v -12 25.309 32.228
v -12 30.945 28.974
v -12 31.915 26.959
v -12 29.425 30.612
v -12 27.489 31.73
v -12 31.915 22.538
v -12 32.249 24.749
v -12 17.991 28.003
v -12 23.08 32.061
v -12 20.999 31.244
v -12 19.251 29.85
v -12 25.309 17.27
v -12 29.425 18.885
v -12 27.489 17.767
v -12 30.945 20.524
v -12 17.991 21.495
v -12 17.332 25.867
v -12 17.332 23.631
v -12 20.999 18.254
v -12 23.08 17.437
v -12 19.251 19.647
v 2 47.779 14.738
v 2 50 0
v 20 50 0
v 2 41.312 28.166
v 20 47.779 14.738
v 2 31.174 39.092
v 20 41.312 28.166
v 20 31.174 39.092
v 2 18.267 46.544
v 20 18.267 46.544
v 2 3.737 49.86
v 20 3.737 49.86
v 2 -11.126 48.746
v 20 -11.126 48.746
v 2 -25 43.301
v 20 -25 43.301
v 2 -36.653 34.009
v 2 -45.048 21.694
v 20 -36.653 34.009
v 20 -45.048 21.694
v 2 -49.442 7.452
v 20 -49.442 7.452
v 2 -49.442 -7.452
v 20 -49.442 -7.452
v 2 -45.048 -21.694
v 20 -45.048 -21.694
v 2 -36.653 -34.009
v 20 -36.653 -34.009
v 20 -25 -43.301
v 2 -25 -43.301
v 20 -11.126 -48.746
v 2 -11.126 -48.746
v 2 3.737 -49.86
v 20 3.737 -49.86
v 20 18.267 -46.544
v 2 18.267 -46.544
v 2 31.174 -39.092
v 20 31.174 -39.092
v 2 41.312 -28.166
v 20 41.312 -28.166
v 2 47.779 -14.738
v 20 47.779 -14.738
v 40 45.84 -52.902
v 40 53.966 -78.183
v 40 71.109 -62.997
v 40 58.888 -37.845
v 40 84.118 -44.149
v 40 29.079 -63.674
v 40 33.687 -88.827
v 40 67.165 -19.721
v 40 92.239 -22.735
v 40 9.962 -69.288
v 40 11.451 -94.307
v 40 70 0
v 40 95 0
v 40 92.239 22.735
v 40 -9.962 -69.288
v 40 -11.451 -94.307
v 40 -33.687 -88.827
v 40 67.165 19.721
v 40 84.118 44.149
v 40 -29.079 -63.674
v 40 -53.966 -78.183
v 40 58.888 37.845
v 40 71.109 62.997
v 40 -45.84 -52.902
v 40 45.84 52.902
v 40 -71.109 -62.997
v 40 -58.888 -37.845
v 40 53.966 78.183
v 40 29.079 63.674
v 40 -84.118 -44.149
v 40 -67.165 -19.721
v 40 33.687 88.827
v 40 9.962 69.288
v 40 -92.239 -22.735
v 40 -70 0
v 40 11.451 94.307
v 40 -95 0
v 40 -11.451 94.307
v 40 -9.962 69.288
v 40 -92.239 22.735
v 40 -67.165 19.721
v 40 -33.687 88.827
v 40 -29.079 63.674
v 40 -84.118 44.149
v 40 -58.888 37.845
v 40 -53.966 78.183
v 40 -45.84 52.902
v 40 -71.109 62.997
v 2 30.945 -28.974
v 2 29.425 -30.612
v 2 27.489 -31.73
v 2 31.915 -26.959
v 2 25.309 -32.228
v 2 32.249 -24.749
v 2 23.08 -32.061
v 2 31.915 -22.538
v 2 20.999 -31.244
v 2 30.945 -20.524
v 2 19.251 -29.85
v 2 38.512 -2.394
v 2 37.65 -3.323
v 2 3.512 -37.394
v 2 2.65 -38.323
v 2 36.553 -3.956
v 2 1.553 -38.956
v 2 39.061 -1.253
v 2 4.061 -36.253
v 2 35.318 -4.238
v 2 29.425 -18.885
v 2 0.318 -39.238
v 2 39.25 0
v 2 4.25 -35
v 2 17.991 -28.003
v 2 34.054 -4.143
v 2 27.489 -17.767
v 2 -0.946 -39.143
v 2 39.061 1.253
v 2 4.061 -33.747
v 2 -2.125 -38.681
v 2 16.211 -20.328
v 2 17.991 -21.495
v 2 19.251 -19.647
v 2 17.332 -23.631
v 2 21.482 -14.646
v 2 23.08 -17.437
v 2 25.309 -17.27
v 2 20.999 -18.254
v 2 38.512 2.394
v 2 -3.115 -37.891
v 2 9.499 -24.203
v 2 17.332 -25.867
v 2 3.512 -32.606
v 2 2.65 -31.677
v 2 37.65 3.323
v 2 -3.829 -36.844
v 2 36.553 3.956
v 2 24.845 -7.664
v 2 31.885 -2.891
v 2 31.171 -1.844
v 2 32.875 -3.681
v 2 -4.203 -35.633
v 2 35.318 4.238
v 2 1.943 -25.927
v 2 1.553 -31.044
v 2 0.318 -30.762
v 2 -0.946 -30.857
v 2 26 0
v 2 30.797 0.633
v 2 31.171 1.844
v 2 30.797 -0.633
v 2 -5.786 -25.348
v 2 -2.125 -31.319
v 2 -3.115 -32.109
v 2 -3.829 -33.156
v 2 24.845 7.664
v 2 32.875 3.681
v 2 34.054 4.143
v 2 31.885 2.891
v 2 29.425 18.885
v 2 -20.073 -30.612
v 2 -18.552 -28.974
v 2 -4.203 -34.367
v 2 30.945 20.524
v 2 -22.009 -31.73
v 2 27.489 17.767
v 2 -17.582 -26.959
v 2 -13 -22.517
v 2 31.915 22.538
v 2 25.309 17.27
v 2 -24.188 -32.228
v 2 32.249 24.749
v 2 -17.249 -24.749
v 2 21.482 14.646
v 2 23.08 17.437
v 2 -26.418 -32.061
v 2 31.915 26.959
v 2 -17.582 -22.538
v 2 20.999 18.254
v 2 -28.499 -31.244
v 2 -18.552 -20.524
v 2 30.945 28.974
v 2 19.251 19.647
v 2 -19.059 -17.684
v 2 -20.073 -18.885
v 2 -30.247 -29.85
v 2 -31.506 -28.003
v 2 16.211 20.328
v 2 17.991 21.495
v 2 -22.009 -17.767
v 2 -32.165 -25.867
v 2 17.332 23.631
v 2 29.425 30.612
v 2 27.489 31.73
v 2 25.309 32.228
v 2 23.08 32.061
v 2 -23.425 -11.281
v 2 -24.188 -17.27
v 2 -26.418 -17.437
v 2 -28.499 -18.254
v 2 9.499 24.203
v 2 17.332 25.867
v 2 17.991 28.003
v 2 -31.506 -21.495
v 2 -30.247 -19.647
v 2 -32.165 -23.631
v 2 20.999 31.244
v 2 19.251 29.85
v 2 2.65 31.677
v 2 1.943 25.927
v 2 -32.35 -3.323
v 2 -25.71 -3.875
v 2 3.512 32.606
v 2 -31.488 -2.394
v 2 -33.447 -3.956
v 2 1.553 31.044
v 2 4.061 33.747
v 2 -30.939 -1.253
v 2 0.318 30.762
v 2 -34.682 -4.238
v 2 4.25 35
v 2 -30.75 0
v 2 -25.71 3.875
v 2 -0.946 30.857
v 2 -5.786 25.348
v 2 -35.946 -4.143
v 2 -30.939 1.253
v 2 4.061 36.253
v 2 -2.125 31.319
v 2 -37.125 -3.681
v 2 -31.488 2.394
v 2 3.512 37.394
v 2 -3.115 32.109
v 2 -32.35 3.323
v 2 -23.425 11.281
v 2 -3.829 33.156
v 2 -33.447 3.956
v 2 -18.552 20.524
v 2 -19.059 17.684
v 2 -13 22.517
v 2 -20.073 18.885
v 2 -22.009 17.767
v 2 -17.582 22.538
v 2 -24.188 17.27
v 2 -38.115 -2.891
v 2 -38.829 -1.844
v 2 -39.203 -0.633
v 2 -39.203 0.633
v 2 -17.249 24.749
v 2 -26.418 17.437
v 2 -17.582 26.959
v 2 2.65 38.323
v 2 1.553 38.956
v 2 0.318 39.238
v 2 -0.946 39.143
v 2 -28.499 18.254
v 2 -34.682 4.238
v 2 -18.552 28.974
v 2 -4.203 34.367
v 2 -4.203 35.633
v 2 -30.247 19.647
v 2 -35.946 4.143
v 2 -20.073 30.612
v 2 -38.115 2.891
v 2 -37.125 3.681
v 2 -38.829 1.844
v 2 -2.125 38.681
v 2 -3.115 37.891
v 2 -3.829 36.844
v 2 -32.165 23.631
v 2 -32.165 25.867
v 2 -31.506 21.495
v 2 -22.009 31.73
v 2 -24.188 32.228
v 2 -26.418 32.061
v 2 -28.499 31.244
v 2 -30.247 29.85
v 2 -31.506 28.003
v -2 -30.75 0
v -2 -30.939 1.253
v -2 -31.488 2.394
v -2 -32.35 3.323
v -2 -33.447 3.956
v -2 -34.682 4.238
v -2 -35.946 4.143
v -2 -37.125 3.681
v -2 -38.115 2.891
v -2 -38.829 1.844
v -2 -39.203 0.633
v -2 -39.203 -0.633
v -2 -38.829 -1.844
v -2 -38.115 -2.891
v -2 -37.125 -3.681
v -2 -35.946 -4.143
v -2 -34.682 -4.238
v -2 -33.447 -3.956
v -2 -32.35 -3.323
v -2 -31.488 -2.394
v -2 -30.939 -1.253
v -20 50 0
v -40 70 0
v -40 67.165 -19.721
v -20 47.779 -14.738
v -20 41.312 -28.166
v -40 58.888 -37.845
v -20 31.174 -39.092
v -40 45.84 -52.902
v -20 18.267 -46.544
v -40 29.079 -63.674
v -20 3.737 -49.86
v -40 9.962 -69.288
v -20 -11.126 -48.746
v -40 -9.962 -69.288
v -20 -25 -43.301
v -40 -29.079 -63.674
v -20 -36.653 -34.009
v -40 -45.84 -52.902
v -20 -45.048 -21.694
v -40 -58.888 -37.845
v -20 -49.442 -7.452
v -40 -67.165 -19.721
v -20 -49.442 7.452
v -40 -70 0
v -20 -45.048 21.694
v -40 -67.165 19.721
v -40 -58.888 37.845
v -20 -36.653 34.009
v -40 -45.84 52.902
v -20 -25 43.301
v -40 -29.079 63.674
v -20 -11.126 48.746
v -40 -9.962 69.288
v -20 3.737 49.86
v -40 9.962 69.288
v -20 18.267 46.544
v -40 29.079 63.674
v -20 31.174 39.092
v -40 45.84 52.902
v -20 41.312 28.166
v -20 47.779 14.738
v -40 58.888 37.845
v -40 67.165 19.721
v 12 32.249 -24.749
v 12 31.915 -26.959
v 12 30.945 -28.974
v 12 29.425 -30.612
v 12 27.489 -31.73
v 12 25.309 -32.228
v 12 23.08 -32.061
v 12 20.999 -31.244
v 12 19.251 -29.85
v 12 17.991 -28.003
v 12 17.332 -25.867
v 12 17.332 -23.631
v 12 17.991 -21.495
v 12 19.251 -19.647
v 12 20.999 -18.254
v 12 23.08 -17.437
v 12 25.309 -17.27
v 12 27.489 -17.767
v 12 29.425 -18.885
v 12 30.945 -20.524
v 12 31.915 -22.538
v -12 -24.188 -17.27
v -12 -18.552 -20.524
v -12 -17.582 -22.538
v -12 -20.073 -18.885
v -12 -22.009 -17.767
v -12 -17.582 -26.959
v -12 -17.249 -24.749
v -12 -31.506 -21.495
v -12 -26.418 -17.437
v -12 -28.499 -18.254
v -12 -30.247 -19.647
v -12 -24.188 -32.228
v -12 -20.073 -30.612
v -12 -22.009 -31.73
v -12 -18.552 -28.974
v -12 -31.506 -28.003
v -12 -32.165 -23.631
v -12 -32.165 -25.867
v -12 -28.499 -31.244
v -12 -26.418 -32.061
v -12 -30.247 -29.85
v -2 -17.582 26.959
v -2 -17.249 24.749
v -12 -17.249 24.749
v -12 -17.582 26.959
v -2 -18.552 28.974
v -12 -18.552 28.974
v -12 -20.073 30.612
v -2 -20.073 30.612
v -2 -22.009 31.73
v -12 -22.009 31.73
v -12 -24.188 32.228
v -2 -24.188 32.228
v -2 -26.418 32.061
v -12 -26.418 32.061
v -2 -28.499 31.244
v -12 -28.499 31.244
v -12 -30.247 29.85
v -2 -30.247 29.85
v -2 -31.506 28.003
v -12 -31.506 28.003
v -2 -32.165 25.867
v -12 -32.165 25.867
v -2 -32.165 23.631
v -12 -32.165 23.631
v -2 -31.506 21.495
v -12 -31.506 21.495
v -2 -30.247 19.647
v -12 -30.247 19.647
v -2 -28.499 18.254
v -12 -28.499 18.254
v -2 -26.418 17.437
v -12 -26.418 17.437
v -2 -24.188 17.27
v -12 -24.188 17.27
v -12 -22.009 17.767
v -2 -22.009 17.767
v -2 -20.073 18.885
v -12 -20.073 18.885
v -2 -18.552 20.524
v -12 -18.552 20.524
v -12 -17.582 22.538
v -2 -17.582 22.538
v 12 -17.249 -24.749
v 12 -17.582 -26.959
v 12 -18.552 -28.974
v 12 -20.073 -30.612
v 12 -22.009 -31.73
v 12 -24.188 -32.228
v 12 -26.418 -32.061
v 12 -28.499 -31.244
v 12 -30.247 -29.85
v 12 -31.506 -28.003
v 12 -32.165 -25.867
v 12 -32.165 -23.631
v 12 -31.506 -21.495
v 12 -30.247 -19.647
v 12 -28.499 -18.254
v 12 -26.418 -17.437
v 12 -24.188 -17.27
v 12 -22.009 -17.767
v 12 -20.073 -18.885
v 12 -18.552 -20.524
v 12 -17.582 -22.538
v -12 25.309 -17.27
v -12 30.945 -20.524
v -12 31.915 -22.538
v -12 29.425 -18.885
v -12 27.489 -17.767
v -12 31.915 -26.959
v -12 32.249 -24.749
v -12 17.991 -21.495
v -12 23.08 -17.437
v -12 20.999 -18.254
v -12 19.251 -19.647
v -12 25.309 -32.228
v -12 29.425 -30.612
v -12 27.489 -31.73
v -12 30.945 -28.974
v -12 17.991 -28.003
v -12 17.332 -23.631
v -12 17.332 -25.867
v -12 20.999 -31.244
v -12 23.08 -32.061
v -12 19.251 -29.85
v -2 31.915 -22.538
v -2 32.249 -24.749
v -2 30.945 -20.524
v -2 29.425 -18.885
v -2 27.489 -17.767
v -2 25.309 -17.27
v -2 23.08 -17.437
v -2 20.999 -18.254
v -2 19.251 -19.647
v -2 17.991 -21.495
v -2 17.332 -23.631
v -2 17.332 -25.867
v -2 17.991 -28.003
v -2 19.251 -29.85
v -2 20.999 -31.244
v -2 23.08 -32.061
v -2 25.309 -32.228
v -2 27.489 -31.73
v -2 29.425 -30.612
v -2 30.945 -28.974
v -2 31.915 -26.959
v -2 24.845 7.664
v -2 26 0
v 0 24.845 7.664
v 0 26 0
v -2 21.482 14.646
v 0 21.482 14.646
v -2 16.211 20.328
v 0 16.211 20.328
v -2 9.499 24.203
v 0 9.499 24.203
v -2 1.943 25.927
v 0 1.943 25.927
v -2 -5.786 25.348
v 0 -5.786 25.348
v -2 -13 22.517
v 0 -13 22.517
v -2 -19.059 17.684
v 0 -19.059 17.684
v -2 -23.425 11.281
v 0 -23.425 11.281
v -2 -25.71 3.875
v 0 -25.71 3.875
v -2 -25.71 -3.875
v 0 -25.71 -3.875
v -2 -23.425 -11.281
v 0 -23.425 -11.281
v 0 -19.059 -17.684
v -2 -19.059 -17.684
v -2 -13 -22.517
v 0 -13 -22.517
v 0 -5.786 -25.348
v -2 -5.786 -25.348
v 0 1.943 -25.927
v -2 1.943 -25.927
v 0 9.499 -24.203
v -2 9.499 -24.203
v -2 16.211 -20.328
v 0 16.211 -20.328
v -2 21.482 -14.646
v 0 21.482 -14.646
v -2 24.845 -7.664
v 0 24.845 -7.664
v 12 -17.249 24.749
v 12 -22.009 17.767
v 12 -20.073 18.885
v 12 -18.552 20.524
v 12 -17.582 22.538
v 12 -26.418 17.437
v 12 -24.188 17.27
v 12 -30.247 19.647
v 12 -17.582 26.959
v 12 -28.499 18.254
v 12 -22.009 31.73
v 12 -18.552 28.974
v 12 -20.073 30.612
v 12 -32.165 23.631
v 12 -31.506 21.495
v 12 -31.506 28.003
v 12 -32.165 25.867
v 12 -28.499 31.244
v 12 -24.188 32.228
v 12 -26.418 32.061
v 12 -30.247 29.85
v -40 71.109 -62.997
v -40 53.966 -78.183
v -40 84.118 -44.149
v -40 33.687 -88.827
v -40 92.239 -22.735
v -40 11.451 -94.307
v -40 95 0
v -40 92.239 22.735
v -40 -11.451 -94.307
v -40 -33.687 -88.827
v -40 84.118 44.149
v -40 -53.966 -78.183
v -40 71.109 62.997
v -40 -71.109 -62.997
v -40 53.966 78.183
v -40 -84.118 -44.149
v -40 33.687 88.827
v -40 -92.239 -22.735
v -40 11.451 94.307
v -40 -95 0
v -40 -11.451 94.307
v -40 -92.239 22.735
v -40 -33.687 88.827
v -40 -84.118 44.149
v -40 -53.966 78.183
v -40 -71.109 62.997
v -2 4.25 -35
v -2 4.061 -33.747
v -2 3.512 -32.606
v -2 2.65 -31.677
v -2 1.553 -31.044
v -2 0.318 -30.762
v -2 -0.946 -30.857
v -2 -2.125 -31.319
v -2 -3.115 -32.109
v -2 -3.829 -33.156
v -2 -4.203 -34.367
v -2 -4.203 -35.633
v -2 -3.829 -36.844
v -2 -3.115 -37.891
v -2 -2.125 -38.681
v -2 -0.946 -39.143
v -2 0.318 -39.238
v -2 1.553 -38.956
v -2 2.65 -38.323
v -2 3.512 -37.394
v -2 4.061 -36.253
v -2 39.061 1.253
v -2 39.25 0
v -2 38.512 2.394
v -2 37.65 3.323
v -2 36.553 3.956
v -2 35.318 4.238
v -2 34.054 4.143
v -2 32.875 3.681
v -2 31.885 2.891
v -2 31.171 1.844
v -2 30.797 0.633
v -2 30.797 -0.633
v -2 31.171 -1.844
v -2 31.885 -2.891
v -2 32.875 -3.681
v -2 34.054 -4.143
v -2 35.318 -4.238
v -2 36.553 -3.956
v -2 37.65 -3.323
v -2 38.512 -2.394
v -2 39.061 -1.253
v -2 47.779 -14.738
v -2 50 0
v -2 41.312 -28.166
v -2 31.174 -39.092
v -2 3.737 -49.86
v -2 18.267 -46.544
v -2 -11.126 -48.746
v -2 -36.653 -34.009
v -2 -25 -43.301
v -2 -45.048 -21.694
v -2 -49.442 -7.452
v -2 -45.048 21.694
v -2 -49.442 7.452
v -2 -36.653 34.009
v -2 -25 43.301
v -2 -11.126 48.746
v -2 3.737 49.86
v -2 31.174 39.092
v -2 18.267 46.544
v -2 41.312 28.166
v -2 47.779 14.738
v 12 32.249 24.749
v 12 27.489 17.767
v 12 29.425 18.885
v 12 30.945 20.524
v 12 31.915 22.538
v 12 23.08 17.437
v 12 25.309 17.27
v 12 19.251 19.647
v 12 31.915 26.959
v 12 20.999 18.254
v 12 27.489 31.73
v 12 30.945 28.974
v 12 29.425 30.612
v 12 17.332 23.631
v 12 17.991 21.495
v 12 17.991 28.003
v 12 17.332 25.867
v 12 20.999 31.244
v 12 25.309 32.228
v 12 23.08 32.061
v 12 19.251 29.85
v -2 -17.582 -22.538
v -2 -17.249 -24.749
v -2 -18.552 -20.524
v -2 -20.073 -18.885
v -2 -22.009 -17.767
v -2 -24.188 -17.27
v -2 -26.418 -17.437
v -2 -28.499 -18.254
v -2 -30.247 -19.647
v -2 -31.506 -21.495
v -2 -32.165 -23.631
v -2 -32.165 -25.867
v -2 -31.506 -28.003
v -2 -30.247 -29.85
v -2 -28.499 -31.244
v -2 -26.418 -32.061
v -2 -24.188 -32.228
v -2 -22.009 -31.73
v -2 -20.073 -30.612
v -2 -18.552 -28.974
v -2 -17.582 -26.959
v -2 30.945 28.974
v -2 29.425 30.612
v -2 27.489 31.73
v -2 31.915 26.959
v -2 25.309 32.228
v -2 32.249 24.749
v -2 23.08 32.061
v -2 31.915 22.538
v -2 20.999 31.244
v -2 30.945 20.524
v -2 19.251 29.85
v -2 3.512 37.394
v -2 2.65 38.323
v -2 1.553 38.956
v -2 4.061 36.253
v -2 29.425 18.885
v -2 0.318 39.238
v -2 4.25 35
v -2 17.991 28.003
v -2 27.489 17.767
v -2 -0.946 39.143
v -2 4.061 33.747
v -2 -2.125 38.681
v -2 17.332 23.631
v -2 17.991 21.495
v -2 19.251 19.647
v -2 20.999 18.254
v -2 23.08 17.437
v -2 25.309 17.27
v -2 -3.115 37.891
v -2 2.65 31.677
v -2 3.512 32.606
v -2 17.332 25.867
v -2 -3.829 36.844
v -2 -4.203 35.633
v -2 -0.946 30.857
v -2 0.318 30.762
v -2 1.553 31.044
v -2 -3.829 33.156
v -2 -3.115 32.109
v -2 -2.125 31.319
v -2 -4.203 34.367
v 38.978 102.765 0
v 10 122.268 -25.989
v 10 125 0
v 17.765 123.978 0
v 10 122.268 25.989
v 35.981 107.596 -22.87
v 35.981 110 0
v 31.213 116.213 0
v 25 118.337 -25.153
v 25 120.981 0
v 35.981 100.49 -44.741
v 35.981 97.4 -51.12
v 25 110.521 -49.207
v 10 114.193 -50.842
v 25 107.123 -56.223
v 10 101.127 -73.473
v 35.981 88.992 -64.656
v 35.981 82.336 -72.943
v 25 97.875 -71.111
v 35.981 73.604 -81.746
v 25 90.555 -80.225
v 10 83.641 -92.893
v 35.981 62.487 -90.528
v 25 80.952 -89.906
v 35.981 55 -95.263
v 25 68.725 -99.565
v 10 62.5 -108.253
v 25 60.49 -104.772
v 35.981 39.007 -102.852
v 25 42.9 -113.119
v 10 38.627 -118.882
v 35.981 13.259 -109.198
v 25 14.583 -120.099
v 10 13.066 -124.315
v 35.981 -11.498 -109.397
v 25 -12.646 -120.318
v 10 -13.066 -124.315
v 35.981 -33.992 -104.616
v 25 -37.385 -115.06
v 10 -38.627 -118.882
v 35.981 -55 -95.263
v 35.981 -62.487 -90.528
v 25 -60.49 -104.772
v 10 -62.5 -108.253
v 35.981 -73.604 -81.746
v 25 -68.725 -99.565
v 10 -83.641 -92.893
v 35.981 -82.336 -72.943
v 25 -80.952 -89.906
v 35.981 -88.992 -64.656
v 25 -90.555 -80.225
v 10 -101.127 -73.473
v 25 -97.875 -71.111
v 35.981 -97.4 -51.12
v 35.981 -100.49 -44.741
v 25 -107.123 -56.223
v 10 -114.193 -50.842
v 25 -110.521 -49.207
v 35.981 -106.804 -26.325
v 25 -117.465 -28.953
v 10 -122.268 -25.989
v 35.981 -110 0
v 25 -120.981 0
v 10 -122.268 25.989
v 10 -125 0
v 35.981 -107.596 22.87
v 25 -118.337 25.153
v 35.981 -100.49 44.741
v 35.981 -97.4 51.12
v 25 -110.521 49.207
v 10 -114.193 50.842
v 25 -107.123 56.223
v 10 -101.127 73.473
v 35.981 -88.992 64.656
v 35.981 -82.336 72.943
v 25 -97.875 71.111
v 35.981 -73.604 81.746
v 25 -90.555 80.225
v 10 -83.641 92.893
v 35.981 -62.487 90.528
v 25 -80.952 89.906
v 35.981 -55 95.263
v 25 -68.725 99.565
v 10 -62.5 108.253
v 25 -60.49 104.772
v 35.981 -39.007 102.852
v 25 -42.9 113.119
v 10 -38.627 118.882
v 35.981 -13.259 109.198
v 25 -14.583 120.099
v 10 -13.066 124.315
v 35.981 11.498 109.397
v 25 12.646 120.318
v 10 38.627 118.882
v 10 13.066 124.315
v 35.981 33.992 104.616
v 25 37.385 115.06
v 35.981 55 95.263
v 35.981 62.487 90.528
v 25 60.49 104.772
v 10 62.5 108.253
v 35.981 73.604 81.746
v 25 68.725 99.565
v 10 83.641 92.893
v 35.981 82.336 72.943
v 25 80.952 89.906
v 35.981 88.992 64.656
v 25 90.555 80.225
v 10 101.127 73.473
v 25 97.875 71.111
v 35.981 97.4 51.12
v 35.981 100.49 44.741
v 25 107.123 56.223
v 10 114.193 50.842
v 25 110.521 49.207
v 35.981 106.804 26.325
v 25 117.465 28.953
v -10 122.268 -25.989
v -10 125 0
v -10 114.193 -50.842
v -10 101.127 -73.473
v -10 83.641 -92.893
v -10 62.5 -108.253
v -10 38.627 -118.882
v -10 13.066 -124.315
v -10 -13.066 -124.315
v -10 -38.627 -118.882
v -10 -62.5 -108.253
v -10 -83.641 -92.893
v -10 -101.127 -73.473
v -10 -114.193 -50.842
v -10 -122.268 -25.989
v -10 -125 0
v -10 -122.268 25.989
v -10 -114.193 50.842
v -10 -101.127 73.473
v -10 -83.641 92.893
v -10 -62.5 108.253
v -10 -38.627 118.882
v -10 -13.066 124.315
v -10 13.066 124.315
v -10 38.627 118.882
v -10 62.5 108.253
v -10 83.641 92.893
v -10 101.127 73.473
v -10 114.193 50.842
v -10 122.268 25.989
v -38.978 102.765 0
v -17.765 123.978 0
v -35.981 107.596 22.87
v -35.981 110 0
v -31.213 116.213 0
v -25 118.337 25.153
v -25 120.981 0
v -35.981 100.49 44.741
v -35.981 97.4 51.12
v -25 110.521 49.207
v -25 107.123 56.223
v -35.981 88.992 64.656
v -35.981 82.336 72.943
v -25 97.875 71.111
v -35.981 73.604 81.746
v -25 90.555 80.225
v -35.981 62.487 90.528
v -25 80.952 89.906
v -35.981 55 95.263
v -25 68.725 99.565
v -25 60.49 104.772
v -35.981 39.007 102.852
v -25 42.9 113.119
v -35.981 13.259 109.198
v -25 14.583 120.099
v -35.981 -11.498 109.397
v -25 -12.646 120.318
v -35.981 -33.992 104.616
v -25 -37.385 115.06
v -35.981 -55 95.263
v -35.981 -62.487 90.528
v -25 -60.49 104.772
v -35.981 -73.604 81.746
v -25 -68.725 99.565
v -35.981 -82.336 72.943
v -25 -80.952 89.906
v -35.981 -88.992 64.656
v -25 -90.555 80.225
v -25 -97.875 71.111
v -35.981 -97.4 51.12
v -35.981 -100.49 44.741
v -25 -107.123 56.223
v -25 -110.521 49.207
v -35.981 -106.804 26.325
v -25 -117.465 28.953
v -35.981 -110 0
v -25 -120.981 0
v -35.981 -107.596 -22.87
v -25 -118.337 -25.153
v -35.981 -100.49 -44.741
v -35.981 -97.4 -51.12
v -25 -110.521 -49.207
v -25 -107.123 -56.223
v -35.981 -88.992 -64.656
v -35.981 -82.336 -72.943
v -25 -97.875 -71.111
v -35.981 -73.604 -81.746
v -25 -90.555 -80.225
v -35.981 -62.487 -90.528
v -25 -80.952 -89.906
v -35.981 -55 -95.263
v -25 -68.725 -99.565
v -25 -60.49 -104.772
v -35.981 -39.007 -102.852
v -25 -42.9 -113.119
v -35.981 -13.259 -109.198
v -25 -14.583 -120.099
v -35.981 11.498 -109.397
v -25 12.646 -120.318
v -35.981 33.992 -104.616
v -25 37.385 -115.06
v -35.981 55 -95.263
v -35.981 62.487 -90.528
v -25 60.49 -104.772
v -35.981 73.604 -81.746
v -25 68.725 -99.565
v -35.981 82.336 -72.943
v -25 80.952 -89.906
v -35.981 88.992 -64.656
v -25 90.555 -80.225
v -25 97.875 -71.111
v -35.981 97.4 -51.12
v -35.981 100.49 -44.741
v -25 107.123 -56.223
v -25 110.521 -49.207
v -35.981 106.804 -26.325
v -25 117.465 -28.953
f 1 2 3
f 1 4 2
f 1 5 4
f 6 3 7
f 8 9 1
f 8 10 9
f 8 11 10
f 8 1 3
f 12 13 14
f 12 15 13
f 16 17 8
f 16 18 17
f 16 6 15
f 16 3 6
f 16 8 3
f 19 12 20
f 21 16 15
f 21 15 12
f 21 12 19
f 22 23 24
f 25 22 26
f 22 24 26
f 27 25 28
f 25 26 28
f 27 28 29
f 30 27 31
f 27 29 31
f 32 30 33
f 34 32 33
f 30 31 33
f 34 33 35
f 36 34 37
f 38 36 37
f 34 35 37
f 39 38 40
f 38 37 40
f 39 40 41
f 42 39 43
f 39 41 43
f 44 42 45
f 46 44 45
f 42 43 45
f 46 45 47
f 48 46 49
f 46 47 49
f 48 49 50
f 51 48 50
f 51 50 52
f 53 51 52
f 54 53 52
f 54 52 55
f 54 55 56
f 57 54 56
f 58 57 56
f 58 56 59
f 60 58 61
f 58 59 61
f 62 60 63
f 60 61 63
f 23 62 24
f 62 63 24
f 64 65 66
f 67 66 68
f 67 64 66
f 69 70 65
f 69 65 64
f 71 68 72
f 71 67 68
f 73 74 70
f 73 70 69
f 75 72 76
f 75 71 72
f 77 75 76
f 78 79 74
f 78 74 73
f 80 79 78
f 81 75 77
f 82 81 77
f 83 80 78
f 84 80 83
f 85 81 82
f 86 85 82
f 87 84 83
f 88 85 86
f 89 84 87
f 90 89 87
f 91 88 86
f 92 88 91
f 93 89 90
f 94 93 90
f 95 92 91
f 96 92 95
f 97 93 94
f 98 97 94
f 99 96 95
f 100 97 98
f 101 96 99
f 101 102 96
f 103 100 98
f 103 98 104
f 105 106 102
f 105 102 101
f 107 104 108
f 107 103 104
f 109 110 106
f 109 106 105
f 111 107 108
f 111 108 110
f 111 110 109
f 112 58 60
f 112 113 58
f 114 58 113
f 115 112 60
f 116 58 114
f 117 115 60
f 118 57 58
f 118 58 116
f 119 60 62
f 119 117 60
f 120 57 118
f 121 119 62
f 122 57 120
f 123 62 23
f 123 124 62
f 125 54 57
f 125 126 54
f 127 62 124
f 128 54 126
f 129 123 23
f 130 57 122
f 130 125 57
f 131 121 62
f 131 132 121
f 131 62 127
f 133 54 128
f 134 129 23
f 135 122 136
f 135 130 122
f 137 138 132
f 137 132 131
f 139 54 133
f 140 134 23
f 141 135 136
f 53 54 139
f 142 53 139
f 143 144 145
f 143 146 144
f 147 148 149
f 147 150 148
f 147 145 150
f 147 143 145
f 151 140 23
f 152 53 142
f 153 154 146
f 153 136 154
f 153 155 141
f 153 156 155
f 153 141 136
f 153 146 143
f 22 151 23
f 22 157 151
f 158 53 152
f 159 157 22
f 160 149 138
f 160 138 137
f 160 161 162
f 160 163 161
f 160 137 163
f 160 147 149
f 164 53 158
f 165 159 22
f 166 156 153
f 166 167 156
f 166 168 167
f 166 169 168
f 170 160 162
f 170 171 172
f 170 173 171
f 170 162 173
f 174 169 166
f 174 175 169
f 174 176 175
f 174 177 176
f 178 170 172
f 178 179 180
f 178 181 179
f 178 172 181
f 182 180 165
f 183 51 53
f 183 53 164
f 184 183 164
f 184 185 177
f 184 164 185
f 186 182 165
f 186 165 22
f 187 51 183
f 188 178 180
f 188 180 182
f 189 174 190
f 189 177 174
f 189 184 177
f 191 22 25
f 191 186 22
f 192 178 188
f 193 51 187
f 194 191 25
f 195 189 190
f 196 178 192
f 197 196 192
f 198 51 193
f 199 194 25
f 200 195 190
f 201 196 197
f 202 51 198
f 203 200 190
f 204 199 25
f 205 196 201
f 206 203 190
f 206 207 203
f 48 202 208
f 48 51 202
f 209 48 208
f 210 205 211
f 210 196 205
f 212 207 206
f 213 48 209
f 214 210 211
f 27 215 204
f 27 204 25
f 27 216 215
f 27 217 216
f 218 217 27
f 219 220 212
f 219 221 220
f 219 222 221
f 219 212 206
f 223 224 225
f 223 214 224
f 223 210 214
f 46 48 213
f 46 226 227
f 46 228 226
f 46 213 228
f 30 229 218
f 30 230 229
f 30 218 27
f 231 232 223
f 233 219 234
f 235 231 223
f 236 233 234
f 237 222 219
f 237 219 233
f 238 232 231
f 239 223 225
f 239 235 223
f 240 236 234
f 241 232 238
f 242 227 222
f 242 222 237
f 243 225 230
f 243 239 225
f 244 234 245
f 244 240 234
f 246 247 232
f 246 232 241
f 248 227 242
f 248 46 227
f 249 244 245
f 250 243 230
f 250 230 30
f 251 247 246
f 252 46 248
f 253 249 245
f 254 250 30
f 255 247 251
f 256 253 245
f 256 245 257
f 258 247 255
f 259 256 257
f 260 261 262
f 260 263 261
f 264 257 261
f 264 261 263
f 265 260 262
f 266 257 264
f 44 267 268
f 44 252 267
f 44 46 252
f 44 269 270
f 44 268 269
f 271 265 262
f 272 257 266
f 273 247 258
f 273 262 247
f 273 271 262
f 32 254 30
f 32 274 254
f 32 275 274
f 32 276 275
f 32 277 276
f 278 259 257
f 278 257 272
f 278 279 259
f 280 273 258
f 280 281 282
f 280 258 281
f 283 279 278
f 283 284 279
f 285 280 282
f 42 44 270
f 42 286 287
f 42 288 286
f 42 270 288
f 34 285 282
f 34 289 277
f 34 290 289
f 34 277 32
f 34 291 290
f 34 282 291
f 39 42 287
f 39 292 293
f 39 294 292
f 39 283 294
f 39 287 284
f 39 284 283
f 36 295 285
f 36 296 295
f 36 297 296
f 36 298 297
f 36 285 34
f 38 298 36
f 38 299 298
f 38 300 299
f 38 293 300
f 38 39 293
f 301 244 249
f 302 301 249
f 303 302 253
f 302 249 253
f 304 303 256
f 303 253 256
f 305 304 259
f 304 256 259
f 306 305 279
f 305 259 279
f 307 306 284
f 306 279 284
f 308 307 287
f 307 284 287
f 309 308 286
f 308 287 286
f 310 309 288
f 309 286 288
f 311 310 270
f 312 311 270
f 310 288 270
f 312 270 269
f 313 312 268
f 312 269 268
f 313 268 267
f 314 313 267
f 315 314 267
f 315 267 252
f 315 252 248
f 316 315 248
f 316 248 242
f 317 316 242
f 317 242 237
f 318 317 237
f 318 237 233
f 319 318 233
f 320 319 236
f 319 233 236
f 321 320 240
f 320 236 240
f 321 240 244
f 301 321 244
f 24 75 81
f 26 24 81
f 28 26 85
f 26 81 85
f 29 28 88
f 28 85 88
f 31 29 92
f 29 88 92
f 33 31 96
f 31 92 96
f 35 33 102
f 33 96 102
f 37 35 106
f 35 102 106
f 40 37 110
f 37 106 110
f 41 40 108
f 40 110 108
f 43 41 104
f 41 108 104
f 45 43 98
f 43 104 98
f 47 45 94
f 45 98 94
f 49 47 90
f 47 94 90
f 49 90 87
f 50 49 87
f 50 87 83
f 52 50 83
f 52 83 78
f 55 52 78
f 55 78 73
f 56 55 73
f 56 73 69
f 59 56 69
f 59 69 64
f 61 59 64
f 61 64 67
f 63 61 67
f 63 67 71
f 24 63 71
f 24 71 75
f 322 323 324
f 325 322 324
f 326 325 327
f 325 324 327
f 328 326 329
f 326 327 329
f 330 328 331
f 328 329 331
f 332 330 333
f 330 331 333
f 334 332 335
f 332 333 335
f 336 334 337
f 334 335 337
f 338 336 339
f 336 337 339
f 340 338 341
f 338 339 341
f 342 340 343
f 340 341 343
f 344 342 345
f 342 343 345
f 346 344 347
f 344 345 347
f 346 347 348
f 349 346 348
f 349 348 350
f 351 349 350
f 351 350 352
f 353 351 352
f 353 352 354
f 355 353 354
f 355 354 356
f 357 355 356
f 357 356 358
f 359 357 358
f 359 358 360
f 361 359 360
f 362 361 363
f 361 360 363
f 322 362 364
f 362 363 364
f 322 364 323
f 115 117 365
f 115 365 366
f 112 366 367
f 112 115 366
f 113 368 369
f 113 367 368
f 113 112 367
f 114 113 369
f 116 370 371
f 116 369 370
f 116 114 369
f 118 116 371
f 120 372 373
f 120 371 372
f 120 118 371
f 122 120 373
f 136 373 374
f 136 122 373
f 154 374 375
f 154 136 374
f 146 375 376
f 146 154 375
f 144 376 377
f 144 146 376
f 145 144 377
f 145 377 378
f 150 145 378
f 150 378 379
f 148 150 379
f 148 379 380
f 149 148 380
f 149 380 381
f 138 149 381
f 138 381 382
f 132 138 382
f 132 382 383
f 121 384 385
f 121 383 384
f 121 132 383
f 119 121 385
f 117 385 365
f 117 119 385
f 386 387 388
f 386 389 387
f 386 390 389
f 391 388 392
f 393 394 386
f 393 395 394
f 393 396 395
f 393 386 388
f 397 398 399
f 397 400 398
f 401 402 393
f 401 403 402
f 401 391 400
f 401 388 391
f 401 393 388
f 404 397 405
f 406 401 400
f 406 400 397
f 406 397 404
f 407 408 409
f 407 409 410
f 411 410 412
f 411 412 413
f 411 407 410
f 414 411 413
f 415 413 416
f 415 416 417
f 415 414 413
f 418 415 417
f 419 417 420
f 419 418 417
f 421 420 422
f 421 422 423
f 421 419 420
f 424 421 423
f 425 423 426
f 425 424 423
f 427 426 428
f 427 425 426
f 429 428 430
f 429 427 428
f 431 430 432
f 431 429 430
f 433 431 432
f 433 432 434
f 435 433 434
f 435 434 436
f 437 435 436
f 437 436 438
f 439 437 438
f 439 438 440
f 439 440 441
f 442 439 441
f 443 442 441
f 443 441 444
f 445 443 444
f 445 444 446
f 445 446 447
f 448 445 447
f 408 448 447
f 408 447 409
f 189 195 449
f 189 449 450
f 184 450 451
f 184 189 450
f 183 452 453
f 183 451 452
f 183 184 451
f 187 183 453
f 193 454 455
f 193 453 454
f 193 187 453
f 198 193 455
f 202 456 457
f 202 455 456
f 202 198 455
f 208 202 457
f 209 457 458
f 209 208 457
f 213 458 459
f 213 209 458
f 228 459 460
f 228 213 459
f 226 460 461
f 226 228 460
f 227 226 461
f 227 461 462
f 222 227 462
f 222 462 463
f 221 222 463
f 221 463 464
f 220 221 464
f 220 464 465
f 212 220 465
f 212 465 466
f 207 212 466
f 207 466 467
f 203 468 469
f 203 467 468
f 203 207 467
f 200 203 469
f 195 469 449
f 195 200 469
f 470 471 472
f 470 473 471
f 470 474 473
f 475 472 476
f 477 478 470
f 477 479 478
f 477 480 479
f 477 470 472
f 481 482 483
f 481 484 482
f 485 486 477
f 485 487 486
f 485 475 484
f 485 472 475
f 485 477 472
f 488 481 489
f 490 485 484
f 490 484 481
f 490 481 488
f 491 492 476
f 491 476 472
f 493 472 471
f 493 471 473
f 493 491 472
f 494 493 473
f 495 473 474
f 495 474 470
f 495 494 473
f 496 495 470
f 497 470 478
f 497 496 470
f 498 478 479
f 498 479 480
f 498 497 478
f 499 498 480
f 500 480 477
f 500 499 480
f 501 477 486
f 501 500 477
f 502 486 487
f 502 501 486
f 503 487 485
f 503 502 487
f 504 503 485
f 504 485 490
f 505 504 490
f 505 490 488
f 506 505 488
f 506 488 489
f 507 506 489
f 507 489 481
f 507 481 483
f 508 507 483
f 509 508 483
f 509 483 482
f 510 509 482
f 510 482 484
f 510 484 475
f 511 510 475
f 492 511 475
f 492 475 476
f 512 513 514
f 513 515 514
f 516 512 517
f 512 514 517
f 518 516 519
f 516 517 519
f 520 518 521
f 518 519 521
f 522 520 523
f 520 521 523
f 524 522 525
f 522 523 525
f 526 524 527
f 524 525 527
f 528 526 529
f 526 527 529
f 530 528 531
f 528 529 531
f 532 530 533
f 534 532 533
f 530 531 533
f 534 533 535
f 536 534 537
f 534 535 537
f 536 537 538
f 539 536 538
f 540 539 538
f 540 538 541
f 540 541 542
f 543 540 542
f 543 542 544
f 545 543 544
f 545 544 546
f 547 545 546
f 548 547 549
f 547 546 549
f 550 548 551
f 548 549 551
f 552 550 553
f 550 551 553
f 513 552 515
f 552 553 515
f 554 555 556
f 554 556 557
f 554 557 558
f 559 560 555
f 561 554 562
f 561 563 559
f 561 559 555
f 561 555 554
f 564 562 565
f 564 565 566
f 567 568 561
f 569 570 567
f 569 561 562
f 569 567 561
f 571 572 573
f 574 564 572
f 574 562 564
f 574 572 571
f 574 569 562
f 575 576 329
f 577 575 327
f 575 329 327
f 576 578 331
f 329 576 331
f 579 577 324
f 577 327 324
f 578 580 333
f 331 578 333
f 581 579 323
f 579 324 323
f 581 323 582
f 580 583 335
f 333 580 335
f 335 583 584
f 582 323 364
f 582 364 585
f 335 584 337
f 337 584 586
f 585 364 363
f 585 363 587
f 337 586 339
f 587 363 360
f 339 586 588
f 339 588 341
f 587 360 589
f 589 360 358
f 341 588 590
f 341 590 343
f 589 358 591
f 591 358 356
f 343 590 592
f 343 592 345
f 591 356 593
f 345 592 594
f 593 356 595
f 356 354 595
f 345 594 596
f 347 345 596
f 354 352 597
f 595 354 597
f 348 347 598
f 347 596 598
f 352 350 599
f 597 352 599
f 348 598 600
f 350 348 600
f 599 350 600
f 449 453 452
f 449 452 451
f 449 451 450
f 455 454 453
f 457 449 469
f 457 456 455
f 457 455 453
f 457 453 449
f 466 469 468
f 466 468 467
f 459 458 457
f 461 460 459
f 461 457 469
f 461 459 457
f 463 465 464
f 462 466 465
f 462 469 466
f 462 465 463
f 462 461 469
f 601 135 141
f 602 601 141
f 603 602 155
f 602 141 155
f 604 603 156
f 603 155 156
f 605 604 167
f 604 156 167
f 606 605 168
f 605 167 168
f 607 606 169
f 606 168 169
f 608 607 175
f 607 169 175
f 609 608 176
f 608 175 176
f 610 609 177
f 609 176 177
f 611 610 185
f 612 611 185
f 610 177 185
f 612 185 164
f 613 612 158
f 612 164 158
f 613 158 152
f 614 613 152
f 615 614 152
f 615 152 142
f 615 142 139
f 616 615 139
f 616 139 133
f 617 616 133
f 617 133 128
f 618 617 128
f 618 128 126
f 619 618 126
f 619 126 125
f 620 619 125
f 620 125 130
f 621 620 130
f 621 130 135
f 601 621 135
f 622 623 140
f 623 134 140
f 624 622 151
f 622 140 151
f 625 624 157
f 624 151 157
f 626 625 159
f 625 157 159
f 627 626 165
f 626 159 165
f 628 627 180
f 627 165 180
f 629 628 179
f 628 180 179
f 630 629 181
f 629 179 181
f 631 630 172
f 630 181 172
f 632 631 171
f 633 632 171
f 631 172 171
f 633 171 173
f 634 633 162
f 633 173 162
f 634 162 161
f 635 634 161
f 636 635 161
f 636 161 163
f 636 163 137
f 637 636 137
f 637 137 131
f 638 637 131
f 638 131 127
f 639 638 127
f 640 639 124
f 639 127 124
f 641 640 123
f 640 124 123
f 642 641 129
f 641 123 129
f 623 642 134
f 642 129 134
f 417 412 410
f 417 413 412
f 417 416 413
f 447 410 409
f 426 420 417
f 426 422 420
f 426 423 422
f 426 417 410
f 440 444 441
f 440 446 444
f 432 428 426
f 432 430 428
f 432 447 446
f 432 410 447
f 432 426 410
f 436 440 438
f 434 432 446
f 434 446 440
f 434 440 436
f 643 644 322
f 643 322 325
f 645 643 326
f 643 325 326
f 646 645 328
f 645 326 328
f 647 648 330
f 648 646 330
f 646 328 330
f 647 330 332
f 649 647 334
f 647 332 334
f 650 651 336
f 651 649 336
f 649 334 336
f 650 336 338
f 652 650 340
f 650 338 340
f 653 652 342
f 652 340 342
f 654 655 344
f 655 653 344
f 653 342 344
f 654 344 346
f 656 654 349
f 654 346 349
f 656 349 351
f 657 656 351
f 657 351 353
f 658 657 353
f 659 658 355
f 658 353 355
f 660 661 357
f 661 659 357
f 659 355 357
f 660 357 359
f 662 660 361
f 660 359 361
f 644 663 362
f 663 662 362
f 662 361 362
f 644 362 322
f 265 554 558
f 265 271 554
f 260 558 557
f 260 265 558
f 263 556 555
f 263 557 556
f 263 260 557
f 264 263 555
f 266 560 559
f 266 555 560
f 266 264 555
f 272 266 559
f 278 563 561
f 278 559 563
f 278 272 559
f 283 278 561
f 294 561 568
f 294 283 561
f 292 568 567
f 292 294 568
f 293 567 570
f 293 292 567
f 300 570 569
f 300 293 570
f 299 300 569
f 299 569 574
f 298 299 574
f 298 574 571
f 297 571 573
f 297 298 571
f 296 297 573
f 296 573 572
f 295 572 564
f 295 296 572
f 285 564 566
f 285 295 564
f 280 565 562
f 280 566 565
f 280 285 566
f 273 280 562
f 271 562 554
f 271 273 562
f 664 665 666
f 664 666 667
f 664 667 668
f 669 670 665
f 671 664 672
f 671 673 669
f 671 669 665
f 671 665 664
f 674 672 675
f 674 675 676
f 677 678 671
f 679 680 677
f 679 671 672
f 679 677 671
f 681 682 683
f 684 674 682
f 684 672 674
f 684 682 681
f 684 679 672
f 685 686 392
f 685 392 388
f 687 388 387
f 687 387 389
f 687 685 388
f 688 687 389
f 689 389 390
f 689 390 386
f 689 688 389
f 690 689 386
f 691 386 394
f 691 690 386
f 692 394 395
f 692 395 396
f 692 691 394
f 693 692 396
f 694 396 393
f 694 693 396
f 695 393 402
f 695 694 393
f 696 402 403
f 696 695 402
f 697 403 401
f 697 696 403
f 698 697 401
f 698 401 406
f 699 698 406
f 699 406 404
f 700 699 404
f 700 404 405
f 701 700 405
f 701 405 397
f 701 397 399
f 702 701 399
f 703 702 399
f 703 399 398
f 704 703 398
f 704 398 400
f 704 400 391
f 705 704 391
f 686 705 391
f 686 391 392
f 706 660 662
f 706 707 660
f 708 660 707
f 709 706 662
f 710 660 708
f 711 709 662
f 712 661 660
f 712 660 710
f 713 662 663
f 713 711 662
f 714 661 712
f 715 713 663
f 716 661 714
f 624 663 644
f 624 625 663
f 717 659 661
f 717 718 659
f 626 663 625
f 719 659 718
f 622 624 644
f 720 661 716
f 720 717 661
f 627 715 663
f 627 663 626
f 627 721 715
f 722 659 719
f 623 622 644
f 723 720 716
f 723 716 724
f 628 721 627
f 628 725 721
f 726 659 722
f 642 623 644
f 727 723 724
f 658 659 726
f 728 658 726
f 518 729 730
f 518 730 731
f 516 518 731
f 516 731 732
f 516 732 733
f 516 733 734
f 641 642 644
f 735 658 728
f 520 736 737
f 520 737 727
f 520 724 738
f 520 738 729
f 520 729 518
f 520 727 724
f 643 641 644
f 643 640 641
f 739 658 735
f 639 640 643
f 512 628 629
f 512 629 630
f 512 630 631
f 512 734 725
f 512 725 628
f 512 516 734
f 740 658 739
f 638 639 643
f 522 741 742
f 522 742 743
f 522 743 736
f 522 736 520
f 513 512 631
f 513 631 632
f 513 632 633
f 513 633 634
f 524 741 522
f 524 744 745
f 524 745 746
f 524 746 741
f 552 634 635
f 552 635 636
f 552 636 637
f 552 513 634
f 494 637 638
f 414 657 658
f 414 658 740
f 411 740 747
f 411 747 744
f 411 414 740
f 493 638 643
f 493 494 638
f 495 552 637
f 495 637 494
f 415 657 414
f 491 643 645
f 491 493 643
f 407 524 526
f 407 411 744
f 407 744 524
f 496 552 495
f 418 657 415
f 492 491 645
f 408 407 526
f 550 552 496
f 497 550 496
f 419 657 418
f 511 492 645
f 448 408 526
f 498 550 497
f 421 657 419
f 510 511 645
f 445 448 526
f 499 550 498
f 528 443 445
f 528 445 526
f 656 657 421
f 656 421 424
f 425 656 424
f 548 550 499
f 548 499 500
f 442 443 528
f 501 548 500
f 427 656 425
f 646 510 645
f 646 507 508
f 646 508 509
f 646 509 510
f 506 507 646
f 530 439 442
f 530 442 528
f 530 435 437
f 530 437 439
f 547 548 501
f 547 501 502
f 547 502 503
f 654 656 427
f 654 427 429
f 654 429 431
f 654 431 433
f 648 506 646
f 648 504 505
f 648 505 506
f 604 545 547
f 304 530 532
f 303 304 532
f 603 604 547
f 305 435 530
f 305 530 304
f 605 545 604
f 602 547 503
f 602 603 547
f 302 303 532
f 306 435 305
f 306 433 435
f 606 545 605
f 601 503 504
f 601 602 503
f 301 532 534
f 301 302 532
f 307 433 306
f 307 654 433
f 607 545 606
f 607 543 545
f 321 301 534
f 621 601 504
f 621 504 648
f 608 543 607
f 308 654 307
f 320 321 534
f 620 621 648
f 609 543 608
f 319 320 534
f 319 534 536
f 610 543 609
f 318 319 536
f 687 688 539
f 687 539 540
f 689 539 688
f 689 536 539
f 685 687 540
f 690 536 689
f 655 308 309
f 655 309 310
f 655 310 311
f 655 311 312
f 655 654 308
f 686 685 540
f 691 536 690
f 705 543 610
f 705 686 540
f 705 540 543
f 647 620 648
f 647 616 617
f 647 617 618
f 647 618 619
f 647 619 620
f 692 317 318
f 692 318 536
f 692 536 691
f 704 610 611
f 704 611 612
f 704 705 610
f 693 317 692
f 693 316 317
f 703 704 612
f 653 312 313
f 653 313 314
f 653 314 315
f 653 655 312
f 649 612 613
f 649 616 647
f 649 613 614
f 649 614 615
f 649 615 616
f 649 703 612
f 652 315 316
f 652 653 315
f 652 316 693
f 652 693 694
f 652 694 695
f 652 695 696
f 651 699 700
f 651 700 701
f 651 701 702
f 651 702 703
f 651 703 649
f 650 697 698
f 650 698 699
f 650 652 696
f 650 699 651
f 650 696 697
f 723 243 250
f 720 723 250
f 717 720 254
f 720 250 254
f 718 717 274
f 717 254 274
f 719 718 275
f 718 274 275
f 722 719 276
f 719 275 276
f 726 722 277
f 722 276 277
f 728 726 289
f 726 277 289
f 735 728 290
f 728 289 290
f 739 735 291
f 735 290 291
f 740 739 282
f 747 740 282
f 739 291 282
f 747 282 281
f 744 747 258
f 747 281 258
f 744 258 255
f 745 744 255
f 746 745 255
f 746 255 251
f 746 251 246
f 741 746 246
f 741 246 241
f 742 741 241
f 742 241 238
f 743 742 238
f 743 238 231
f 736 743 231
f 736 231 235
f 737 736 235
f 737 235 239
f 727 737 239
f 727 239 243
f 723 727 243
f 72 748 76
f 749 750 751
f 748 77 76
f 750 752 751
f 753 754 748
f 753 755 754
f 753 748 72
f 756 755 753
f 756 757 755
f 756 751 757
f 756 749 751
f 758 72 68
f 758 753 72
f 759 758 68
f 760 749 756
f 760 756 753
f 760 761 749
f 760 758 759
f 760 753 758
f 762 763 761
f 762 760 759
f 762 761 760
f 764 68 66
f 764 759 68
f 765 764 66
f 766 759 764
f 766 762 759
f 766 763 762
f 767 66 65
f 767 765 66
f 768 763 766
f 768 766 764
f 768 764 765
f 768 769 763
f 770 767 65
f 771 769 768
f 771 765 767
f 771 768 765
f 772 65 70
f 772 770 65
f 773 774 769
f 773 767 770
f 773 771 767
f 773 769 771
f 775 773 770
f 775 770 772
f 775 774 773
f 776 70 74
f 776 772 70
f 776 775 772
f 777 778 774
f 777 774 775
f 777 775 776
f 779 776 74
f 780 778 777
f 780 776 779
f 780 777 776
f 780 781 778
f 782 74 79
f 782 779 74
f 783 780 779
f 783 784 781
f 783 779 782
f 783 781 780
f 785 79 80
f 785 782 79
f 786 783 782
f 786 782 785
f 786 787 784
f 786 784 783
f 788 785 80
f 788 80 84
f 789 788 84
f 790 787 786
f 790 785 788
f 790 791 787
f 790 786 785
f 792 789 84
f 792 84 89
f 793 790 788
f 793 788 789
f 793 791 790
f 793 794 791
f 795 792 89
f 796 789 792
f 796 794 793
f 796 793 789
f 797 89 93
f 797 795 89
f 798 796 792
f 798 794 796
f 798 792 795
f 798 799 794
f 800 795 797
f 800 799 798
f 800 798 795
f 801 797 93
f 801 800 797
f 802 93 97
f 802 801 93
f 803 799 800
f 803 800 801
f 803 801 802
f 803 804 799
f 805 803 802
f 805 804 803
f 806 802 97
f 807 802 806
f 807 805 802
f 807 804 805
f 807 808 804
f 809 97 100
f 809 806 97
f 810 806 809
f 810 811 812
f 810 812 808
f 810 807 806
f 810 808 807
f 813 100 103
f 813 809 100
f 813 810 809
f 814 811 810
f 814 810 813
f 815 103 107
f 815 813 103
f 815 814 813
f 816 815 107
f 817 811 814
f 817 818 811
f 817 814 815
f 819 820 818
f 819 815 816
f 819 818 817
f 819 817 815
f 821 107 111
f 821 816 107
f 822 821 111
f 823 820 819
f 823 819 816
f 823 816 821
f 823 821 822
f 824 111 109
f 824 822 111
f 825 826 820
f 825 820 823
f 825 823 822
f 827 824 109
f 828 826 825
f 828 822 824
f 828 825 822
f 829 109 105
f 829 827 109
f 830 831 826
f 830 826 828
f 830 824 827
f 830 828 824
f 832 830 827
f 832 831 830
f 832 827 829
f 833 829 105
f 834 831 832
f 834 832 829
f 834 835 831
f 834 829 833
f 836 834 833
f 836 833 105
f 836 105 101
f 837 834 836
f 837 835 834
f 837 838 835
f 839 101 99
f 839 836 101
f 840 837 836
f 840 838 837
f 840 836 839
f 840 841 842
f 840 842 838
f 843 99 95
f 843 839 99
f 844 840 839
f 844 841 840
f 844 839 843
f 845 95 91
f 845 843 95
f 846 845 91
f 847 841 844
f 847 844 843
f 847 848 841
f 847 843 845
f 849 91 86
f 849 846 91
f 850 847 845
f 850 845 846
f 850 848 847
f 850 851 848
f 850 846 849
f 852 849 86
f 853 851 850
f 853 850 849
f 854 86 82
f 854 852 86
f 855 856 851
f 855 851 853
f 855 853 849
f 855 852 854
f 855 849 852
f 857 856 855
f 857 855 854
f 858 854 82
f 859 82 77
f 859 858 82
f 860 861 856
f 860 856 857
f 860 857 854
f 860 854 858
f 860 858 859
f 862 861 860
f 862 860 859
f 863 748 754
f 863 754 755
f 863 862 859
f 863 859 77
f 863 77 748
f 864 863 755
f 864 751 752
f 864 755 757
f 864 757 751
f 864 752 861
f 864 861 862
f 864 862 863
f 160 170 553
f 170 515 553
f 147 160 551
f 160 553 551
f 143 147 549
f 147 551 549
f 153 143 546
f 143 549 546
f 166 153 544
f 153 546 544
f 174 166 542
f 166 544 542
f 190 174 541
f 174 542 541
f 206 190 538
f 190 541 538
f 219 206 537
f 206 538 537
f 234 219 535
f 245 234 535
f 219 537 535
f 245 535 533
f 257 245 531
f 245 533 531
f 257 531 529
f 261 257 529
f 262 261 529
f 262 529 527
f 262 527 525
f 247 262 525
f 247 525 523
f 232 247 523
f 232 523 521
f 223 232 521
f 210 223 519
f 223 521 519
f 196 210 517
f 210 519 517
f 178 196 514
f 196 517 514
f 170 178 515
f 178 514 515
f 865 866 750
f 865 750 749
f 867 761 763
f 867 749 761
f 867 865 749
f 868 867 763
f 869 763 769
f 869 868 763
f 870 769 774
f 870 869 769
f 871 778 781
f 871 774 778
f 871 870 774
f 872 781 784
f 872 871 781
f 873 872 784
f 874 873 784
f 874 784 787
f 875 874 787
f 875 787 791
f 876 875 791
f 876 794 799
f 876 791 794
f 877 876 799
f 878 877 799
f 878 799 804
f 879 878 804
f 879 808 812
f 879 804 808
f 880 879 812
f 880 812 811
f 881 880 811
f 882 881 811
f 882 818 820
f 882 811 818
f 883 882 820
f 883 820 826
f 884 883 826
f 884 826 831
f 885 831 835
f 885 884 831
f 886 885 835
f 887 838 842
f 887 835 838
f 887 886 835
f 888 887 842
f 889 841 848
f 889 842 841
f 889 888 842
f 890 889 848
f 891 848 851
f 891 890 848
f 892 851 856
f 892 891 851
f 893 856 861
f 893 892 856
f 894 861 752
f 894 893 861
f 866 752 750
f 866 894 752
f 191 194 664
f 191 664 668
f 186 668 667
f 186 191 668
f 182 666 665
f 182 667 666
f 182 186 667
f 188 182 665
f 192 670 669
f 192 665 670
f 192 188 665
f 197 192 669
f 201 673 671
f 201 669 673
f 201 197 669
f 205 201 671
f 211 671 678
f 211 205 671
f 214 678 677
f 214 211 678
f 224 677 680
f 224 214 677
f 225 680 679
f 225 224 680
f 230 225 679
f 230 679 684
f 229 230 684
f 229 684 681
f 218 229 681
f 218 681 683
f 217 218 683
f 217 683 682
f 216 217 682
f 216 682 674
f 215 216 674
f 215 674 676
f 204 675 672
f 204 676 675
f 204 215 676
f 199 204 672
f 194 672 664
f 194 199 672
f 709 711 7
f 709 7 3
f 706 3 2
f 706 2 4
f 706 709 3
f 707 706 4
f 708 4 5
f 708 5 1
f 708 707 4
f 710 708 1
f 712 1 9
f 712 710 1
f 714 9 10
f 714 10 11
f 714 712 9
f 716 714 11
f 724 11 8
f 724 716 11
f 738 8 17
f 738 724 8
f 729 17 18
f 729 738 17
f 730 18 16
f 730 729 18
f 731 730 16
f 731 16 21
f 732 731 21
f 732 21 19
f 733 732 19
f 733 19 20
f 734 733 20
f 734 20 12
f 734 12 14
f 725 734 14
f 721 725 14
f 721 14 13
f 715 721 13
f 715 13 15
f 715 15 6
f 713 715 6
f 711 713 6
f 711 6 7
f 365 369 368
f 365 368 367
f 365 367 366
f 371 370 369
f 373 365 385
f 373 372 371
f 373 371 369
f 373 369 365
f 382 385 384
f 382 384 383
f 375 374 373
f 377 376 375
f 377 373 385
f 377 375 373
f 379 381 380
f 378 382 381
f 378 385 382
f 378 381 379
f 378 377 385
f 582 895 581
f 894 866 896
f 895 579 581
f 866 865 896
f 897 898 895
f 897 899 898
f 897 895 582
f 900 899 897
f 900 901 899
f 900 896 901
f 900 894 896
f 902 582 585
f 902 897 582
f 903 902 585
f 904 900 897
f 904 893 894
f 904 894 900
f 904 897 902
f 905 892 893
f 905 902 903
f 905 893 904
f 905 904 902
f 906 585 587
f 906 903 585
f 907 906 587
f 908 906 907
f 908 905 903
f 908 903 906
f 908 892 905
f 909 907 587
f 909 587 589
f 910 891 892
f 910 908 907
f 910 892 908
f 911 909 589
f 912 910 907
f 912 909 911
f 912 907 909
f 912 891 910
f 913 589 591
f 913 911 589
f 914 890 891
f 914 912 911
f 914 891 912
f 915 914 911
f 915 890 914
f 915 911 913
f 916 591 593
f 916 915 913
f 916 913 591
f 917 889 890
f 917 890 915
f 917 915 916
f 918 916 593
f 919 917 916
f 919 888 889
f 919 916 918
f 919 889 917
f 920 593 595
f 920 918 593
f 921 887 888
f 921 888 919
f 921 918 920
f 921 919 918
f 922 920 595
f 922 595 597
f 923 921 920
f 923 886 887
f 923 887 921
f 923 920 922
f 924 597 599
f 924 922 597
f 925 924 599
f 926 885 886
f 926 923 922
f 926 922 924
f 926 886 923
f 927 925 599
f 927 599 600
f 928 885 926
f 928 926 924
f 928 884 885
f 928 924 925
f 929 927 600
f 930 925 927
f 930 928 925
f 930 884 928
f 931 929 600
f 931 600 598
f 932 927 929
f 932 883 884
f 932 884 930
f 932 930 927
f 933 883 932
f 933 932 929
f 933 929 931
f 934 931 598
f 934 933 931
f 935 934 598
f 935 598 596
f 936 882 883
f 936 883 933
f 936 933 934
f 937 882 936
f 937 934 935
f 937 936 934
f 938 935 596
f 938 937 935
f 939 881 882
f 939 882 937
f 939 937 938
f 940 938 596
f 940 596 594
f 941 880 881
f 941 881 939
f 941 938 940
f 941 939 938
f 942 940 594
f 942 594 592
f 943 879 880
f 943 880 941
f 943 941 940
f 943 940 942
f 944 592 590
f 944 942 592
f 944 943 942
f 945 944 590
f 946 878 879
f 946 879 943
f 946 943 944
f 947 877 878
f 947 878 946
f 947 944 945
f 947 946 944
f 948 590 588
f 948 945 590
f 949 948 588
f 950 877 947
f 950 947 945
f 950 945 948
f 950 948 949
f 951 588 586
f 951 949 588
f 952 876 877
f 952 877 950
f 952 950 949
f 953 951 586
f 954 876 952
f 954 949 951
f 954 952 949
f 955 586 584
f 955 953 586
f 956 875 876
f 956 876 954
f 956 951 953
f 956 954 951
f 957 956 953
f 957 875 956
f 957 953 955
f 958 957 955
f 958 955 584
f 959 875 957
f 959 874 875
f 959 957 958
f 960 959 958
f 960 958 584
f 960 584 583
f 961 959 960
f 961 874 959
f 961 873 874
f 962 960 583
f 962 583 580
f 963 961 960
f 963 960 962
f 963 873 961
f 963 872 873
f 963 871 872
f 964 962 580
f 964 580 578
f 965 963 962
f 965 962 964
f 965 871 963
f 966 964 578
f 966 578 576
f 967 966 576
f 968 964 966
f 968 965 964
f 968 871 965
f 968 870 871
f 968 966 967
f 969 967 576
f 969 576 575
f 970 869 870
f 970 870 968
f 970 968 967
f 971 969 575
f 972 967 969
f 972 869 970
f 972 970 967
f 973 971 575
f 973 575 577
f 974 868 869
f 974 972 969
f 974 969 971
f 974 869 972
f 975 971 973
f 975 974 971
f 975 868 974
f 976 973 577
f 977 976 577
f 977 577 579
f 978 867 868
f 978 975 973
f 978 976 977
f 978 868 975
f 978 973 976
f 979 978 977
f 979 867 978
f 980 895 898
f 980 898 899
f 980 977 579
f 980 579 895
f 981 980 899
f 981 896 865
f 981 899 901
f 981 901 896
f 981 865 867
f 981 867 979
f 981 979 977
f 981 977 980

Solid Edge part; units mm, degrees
sketch "Sketch1" plane through (0, 0, 0) normal (1, 0, 0) x (0, 1, 0)
  circle A0 centre (0, 0) radius 125
  circle A1 centre (0, 0) radius 26
  dimension "D1" = 250
  dimension "D2" = 52
extrude "Protrusion1" add sketch "Sketch1" along normal mid plane 80
sketch "Sketch2" plane through (40, 0, 0) normal (1, 0, 0) x (0, 1, 0)
  circle A0 centre (0, 0) radius 50
extrude "Extrusionsausschnitt_1" cut sketch "Sketch2" against normal blind 38
chamfer "Fase_1" distance 20 angle 45 1 edges at (40, -50, 0)
fillet "Verrundung_1" radius 30 1 edges at (40, -125, 0)
mirror "Mirror1" about plane through (0, 0, 0) normal (1, 0, 0) of "Extrusionsausschnitt_1", "Fase_1", "Verrundung_1"
sketch "Sketch3" plane through (2, 0, 0) normal (1, 0, 0) x (0, 1, 0)
  circle A0 centre (0, 35) radius 4.25
  circle A1 centre (35, 0) radius 4.25
  circle A2 centre (0, -35) radius 4.25
  circle A3 centre (-35, 0) radius 4.25
  dimension "D1" = 70
  dimension "D2" = 8.5
extrude "Extrusionsausschnitt_2" cut sketch "Sketch3" against normal blind 295
sketch "Sketch4" plane through (2, 0, 0) normal (1, 0, 0) x (0, 1, 0)
  circle A0 centre (24.7487, 24.7487) radius 7.5
  circle A1 centre (-24.7487, 24.7487) radius 7.5
  circle A2 centre (24.7487, -24.7487) radius 7.5
  circle A3 centre (-24.7487, -24.7487) radius 7.5
extrude "Extrusionsausprägung_2" add sketch "Sketch4" along normal blind 10
mirror "Mirror2" about plane through (0, 0, 0) normal (1, 0, 0) of "Extrusionsausprägung_2"
